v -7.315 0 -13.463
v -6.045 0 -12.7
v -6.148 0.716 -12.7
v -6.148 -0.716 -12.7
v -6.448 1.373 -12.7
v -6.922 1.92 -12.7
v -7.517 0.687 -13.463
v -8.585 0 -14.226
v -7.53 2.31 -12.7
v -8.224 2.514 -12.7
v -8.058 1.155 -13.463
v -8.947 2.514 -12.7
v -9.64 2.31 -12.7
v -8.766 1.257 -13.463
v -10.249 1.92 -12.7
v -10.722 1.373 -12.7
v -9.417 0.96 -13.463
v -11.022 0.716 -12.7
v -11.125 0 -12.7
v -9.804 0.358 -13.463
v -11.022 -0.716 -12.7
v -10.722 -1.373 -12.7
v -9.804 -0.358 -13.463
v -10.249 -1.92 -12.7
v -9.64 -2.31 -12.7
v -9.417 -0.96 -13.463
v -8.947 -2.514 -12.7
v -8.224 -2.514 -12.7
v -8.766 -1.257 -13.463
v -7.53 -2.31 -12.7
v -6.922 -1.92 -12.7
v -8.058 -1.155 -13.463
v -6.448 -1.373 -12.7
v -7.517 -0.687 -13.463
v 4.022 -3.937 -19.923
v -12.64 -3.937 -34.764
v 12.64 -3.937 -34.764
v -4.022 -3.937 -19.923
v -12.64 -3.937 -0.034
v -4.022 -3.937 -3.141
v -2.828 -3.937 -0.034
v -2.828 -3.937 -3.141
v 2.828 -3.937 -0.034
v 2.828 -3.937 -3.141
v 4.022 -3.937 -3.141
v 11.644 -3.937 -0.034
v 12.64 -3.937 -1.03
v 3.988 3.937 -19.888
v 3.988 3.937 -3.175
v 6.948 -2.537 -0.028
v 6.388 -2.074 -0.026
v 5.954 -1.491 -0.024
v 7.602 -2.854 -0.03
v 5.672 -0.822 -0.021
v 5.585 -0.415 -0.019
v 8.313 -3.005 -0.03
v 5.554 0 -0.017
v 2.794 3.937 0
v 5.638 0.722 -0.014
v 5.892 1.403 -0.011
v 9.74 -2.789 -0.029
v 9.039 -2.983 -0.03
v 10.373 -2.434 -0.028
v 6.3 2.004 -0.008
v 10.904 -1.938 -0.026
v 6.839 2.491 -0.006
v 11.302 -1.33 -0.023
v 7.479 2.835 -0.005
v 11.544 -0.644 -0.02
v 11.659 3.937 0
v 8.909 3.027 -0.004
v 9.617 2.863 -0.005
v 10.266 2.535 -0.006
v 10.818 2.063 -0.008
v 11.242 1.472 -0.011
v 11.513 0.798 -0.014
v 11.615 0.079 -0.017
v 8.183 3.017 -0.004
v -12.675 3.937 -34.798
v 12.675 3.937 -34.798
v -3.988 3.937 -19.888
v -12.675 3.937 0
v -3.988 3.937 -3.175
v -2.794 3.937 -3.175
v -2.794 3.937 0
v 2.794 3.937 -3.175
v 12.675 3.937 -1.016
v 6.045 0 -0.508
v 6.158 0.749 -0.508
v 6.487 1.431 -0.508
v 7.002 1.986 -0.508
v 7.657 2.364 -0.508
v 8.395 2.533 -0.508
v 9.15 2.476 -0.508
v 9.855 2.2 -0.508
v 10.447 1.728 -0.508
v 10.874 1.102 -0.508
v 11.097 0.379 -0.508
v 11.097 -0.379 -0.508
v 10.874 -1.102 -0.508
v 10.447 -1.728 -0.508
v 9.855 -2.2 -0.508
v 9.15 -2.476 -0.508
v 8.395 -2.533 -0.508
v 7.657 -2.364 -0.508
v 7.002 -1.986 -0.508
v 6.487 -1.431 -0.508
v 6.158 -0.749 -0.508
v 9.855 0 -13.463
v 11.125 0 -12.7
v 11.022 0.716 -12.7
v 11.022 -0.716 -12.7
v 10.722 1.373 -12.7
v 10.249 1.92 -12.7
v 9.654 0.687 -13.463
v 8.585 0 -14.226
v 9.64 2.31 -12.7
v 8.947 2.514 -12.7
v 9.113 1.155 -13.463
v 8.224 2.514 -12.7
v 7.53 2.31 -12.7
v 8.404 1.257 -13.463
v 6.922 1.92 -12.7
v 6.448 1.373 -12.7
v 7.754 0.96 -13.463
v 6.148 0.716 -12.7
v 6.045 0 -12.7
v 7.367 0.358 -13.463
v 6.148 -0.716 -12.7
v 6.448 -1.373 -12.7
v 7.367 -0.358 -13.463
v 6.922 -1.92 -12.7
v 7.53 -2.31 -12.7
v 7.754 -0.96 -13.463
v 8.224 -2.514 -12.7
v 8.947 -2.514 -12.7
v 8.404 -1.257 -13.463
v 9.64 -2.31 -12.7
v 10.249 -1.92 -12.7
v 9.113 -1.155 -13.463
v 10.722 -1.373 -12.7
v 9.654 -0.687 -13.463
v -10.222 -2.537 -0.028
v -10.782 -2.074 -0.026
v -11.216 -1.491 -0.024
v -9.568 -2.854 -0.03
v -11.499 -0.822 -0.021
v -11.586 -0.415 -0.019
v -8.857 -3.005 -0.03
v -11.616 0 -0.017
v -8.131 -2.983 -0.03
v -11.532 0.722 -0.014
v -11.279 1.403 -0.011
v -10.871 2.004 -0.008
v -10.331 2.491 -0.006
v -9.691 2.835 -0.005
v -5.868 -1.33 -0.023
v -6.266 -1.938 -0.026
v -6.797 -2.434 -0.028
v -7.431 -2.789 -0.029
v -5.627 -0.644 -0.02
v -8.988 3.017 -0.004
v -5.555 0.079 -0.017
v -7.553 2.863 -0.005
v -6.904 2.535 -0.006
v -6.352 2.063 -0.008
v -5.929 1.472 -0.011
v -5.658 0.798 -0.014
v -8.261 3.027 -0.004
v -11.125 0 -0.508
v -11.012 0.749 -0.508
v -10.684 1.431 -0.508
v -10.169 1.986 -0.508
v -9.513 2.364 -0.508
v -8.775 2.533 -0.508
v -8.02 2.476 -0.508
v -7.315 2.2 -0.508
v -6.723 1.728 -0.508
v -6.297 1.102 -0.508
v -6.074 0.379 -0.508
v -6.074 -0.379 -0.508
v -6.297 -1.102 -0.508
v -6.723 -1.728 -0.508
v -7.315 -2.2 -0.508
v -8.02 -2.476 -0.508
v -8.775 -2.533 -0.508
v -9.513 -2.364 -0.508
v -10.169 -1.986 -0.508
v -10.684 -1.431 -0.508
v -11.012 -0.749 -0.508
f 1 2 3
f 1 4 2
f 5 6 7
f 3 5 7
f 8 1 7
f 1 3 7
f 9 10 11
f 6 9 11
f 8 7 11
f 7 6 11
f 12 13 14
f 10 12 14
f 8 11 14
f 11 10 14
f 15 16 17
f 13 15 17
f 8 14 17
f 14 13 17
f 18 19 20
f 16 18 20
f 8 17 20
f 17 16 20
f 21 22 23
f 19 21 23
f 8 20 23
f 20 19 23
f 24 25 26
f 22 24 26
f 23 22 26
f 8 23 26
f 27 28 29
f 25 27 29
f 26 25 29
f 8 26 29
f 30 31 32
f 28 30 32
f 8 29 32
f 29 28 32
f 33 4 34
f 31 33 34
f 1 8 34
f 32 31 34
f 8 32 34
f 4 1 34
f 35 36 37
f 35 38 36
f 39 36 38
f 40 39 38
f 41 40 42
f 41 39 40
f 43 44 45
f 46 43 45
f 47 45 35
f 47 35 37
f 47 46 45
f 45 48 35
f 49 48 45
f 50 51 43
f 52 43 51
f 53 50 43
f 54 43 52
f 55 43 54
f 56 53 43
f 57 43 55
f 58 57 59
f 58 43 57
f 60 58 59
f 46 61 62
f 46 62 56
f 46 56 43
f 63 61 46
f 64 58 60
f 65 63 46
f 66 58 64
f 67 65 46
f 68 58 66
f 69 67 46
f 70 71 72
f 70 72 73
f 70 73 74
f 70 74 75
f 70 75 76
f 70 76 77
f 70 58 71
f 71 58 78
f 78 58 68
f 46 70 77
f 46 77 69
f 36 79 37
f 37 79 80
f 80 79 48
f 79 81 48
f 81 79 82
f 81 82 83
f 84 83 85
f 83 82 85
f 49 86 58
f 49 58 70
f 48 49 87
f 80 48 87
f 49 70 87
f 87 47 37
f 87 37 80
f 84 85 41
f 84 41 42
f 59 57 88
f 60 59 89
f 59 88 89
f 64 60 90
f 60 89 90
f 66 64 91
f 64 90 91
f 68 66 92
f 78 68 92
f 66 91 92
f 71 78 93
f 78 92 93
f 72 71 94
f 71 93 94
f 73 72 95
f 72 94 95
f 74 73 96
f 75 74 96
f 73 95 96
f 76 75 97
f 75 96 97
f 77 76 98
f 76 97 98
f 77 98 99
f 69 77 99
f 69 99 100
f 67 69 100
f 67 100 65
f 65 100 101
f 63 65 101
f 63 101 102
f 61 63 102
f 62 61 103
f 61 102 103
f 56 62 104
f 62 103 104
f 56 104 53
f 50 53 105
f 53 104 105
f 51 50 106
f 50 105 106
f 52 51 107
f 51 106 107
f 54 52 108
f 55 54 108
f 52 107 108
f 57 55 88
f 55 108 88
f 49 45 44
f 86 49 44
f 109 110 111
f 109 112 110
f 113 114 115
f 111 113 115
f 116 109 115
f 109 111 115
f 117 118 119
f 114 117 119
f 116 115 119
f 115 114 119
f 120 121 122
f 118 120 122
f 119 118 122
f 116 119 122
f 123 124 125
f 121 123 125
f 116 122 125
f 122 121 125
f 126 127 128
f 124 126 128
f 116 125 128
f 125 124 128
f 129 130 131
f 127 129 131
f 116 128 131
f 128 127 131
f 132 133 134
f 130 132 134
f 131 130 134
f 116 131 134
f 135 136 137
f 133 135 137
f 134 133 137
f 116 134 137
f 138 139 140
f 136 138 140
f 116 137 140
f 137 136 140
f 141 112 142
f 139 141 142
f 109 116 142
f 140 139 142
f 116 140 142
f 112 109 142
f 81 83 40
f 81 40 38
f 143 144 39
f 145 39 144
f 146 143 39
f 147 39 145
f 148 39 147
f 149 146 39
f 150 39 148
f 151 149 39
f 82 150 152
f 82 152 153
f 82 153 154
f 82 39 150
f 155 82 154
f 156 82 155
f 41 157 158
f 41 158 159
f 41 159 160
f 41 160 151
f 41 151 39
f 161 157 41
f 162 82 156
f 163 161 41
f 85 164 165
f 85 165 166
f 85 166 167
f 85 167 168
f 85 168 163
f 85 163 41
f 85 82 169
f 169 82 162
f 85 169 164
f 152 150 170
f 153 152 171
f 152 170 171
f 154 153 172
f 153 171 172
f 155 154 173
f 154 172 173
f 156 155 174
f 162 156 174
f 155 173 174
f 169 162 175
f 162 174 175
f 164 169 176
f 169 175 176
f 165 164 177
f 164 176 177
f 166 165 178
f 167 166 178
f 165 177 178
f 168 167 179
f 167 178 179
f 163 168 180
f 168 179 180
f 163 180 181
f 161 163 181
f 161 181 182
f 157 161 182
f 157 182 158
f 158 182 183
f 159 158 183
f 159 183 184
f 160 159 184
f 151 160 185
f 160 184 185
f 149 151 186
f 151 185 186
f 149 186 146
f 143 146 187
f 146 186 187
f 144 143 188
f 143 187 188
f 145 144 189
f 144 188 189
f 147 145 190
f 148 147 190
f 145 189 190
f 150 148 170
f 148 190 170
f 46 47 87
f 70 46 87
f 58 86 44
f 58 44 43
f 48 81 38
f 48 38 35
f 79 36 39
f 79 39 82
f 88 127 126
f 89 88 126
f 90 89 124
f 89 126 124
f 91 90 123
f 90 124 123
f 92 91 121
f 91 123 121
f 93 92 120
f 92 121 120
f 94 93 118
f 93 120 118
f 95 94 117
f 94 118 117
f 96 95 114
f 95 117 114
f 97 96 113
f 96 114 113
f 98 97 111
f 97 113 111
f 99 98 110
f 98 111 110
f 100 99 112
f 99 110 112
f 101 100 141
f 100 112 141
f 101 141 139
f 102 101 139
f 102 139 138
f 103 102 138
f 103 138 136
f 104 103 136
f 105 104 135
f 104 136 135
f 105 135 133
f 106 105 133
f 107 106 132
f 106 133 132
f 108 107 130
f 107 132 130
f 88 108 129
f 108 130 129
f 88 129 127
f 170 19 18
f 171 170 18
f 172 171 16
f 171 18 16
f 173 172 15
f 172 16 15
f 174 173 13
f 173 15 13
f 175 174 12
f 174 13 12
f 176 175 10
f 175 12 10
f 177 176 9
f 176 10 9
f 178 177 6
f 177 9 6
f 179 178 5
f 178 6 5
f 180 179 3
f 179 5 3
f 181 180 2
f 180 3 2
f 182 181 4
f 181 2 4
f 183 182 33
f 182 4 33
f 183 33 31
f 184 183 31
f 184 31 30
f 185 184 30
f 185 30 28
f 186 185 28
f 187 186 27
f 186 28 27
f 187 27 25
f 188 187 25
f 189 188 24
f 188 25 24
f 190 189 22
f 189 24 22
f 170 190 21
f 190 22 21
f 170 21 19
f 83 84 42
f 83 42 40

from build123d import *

# Parameters (mm, degrees)
SKETCH1_W                        = 25.3492
SKETCH1_H                        = 7.874
BOSS_EXTRUDE1_DEPTH              = 34.798
CUT_EXTRUDE1_DEPTH               = 8.874
F_97_0_0059_DIAMETER_HOLE1_D     = 5.08
F_97_0_0059_DIAMETER_HOLE1_DEPTH = 12.7
F_97_0_0059_DIAMETER_HOLE1_TIP   = 1.526185972
CHAMFER1_SIZE                    = 0.508
CHAMFER2_SIZE                    = 1.016
DRAFT1_ANGLE                     = -0.25


with BuildPart() as part:
    # Sketch1 → Boss-Extrude1 (new body)
    with BuildSketch(Plane.XY):
        Rectangle(SKETCH1_W, SKETCH1_H)
    extrude(amount=-BOSS_EXTRUDE1_DEPTH)

    # Sketch2 → Cut-Extrude1 (cut, through all)
    with BuildSketch(Plane(origin=(0, 3.937, 0), x_dir=(1, 0, 0), z_dir=(0, 1, 0))):
        Polygon((-2.794, 0), (-2.794, 3.175), (-3.9878, 3.175), (-3.9878, 19.8882), (3.9878, 19.8882), (3.9878, 3.175), (2.794, 3.175), (2.794, 0), align=None)
    extrude(amount=-CUT_EXTRUDE1_DEPTH, mode=Mode.SUBTRACT)

    # #97 (0.0059) Diameter Hole1
    with Locations(Plane.XY):
        with Locations((-8.5852, 0), (8.5852, 0)):
            Hole(F_97_0_0059_DIAMETER_HOLE1_D / 2, depth=F_97_0_0059_DIAMETER_HOLE1_DEPTH)
            with Locations((0, 0, -(F_97_0_0059_DIAMETER_HOLE1_DEPTH + F_97_0_0059_DIAMETER_HOLE1_TIP / 2))):  # 118° drill point
                Cone(0, F_97_0_0059_DIAMETER_HOLE1_D / 2, F_97_0_0059_DIAMETER_HOLE1_TIP, mode=Mode.SUBTRACT)

    # Chamfer1
    chamfer1_edges = [part.edges().sort_by_distance(p)[0] for p in [
        (11.1252, 0, 0),
        (-6.0452, 0, 0),
    ]]
    chamfer(chamfer1_edges, length=CHAMFER1_SIZE)

    # Chamfer2
    chamfer2_edges = [part.edges().sort_by_distance(p)[0] for p in [
        (12.6746, 0, 0),
    ]]
    chamfer(chamfer2_edges, length=CHAMFER2_SIZE)

    # Draft1
    draft1_faces = [part.faces().sort_by_distance(p)[0] for p in [
        (12.1666, 0, -0.508),
        (7.2263, 3.818433137, 0),
        (-5.410856764, 0, 0),
        (0, 0, -34.798),
        (-12.6746, 0, -17.399),
        (12.6746, 0, -17.907),
        (-3.3909, 0, -3.175),
        (3.3909, 0, -3.175),
        (2.794, 0, -1.5875),
        (3.9878, 0, -11.5316),
        (-2.794, 0, -1.5875),
        (0, 0, -19.8882),
        (-3.9878, 0, -11.5316),
    ]]
    draft(draft1_faces, Plane(origin=(-12.6746, 3.937, -34.798), x_dir=(1, 0, 0), z_dir=(0, 1, 0)), DRAFT1_ANGLE)


solid = part.part
